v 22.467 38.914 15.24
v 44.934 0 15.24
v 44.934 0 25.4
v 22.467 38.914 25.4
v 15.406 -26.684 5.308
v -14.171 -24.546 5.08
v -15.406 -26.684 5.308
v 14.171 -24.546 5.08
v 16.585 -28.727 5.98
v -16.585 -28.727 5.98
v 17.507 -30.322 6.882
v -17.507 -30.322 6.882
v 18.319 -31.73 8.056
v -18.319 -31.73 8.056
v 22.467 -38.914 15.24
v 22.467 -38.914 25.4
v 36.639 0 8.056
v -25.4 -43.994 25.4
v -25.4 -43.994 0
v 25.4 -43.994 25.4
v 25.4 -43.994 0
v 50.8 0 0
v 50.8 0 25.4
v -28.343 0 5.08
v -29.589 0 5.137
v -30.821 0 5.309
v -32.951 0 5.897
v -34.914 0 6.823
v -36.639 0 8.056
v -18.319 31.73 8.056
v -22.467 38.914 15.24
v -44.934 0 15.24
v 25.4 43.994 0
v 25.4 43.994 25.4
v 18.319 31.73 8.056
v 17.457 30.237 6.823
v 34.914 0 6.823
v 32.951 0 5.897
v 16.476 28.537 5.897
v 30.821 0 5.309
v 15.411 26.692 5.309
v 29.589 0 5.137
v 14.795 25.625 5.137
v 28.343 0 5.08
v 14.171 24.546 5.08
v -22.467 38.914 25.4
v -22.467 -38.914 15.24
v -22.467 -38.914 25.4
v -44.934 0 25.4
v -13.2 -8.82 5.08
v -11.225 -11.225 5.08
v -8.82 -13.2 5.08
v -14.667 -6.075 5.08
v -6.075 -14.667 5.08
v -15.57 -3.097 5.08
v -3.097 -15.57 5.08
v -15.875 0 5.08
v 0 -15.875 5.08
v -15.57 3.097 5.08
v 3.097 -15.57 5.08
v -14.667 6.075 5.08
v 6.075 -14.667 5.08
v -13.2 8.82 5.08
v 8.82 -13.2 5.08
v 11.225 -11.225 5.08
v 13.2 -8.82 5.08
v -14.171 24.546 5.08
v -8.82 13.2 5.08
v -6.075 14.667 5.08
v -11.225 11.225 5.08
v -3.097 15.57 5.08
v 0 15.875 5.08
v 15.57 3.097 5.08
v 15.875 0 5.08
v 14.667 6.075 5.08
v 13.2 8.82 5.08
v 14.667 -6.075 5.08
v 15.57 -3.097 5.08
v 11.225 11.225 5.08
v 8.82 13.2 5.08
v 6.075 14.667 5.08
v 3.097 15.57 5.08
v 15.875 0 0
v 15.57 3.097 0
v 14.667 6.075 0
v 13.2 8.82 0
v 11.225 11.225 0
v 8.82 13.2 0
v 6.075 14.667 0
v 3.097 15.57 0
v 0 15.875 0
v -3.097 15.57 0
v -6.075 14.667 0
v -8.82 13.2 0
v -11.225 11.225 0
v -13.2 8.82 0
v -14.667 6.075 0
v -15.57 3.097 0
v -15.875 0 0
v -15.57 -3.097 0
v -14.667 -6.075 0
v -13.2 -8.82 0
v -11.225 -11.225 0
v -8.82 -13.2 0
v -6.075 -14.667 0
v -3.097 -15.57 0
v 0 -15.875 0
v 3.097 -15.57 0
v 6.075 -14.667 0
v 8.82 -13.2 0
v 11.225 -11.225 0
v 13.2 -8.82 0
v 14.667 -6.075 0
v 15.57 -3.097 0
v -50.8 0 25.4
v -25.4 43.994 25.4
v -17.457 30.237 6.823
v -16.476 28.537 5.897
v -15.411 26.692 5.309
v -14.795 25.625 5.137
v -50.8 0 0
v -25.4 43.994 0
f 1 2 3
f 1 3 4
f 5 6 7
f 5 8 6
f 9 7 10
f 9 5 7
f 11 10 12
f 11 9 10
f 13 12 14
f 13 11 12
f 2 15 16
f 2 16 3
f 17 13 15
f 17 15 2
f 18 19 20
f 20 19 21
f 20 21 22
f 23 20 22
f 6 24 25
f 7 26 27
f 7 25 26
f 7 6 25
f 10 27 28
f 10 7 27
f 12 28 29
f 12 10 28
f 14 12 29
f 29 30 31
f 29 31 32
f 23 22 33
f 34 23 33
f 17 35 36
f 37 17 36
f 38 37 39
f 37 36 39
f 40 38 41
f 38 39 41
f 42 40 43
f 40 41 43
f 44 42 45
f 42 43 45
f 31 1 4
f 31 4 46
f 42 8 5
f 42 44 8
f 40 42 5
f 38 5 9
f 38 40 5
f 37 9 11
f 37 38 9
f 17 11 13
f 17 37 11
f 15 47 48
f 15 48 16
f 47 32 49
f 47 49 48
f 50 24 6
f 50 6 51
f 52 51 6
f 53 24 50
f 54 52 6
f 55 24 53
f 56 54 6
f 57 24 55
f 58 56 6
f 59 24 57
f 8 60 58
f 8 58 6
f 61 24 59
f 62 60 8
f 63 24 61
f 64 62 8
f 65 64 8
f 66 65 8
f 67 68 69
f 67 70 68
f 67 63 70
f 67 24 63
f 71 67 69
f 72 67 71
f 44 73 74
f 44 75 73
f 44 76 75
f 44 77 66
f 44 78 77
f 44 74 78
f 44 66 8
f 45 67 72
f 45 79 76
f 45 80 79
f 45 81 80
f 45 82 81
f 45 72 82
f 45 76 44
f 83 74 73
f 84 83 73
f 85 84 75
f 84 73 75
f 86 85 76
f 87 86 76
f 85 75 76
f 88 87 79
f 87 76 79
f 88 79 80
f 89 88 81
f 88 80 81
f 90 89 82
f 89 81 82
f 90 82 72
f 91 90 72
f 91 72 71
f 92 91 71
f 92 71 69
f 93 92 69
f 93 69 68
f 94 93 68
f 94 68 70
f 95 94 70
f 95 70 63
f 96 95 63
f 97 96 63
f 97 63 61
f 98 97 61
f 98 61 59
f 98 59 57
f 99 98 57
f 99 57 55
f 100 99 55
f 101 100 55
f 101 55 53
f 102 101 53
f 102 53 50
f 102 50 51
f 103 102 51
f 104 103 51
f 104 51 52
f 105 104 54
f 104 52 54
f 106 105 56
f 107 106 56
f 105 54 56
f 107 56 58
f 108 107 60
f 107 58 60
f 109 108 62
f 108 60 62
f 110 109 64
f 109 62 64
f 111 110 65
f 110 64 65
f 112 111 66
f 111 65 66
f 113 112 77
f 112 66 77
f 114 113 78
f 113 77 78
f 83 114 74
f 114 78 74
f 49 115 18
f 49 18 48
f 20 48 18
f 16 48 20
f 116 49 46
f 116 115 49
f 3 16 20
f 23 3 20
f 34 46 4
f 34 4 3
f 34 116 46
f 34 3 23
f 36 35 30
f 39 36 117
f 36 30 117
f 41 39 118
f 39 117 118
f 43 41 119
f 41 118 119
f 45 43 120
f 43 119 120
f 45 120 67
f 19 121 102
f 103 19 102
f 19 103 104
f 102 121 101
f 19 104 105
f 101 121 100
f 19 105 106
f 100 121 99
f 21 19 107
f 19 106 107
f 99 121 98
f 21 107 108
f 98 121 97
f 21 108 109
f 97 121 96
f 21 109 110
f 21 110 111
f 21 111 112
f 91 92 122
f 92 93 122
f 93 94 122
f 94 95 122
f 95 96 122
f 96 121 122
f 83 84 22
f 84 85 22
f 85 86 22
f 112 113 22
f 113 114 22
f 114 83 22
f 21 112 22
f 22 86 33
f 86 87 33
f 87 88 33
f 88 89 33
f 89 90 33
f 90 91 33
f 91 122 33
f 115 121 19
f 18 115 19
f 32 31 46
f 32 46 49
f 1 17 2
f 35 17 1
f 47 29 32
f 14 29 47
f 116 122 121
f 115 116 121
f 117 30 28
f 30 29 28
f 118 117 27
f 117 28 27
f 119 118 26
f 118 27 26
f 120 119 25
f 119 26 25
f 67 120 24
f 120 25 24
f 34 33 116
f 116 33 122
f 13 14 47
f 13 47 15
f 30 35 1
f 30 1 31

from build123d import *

# Parameters (mm, degrees)
F1_DEPTH = 25.4
F2_T     = -5.08
F3_SIZE  = 10.16
F4_R     = 10.16
F5_R     = 15.875
F6_DEPTH = 25.4


with BuildPart() as f1:
    # F0 (on Top) → F1 (new body)
    with BuildSketch(Plane.XY):
        Polygon((25.4, 43.9940905122), (-25.4, 43.9940905122), (-50.8, 0), (-25.4, -43.9940905122), (25.4, -43.9940905122), (50.8, 0), align=None)
    extrude(amount=F1_DEPTH)

    # F2
    f2_openings = [f1.faces().sort_by_distance(p)[0] for p in [
        (0, 0, 25.4),
    ]]
    offset(amount=F2_T, openings=f2_openings)

    # F3
    f3_edges = [f1.edges().sort_by_distance(p)[0] for p in [
        (0, 38.914091, 5.08),
        (33.700591, 19.457045, 5.08),
        (-33.700591, 19.457045, 5.08),
        (-33.700591, -19.457045, 5.08),
        (0, -38.914091, 5.08),
        (33.700591, -19.457045, 5.08),
    ]]
    chamfer(f3_edges, length=F3_SIZE)

    # F4
    f4_edges = [f1.edges().sort_by_distance(p)[0] for p in [
        (0, 28.754091, 5.08),
        (24.901773, 14.377045, 5.08),
        (-24.901773, 14.377045, 5.08),
        (24.901773, -14.377045, 5.08),
        (-24.901773, -14.377045, 5.08),
        (0, -28.754091, 5.08),
    ]]
    fillet(f4_edges, radius=F4_R)

    # F5 (on face) → F6 (cut)
    with BuildSketch(Plane.XY.offset(5.08)):
        Circle(F5_R)
    extrude(amount=-F6_DEPTH, mode=Mode.SUBTRACT)


solid = f1.part
